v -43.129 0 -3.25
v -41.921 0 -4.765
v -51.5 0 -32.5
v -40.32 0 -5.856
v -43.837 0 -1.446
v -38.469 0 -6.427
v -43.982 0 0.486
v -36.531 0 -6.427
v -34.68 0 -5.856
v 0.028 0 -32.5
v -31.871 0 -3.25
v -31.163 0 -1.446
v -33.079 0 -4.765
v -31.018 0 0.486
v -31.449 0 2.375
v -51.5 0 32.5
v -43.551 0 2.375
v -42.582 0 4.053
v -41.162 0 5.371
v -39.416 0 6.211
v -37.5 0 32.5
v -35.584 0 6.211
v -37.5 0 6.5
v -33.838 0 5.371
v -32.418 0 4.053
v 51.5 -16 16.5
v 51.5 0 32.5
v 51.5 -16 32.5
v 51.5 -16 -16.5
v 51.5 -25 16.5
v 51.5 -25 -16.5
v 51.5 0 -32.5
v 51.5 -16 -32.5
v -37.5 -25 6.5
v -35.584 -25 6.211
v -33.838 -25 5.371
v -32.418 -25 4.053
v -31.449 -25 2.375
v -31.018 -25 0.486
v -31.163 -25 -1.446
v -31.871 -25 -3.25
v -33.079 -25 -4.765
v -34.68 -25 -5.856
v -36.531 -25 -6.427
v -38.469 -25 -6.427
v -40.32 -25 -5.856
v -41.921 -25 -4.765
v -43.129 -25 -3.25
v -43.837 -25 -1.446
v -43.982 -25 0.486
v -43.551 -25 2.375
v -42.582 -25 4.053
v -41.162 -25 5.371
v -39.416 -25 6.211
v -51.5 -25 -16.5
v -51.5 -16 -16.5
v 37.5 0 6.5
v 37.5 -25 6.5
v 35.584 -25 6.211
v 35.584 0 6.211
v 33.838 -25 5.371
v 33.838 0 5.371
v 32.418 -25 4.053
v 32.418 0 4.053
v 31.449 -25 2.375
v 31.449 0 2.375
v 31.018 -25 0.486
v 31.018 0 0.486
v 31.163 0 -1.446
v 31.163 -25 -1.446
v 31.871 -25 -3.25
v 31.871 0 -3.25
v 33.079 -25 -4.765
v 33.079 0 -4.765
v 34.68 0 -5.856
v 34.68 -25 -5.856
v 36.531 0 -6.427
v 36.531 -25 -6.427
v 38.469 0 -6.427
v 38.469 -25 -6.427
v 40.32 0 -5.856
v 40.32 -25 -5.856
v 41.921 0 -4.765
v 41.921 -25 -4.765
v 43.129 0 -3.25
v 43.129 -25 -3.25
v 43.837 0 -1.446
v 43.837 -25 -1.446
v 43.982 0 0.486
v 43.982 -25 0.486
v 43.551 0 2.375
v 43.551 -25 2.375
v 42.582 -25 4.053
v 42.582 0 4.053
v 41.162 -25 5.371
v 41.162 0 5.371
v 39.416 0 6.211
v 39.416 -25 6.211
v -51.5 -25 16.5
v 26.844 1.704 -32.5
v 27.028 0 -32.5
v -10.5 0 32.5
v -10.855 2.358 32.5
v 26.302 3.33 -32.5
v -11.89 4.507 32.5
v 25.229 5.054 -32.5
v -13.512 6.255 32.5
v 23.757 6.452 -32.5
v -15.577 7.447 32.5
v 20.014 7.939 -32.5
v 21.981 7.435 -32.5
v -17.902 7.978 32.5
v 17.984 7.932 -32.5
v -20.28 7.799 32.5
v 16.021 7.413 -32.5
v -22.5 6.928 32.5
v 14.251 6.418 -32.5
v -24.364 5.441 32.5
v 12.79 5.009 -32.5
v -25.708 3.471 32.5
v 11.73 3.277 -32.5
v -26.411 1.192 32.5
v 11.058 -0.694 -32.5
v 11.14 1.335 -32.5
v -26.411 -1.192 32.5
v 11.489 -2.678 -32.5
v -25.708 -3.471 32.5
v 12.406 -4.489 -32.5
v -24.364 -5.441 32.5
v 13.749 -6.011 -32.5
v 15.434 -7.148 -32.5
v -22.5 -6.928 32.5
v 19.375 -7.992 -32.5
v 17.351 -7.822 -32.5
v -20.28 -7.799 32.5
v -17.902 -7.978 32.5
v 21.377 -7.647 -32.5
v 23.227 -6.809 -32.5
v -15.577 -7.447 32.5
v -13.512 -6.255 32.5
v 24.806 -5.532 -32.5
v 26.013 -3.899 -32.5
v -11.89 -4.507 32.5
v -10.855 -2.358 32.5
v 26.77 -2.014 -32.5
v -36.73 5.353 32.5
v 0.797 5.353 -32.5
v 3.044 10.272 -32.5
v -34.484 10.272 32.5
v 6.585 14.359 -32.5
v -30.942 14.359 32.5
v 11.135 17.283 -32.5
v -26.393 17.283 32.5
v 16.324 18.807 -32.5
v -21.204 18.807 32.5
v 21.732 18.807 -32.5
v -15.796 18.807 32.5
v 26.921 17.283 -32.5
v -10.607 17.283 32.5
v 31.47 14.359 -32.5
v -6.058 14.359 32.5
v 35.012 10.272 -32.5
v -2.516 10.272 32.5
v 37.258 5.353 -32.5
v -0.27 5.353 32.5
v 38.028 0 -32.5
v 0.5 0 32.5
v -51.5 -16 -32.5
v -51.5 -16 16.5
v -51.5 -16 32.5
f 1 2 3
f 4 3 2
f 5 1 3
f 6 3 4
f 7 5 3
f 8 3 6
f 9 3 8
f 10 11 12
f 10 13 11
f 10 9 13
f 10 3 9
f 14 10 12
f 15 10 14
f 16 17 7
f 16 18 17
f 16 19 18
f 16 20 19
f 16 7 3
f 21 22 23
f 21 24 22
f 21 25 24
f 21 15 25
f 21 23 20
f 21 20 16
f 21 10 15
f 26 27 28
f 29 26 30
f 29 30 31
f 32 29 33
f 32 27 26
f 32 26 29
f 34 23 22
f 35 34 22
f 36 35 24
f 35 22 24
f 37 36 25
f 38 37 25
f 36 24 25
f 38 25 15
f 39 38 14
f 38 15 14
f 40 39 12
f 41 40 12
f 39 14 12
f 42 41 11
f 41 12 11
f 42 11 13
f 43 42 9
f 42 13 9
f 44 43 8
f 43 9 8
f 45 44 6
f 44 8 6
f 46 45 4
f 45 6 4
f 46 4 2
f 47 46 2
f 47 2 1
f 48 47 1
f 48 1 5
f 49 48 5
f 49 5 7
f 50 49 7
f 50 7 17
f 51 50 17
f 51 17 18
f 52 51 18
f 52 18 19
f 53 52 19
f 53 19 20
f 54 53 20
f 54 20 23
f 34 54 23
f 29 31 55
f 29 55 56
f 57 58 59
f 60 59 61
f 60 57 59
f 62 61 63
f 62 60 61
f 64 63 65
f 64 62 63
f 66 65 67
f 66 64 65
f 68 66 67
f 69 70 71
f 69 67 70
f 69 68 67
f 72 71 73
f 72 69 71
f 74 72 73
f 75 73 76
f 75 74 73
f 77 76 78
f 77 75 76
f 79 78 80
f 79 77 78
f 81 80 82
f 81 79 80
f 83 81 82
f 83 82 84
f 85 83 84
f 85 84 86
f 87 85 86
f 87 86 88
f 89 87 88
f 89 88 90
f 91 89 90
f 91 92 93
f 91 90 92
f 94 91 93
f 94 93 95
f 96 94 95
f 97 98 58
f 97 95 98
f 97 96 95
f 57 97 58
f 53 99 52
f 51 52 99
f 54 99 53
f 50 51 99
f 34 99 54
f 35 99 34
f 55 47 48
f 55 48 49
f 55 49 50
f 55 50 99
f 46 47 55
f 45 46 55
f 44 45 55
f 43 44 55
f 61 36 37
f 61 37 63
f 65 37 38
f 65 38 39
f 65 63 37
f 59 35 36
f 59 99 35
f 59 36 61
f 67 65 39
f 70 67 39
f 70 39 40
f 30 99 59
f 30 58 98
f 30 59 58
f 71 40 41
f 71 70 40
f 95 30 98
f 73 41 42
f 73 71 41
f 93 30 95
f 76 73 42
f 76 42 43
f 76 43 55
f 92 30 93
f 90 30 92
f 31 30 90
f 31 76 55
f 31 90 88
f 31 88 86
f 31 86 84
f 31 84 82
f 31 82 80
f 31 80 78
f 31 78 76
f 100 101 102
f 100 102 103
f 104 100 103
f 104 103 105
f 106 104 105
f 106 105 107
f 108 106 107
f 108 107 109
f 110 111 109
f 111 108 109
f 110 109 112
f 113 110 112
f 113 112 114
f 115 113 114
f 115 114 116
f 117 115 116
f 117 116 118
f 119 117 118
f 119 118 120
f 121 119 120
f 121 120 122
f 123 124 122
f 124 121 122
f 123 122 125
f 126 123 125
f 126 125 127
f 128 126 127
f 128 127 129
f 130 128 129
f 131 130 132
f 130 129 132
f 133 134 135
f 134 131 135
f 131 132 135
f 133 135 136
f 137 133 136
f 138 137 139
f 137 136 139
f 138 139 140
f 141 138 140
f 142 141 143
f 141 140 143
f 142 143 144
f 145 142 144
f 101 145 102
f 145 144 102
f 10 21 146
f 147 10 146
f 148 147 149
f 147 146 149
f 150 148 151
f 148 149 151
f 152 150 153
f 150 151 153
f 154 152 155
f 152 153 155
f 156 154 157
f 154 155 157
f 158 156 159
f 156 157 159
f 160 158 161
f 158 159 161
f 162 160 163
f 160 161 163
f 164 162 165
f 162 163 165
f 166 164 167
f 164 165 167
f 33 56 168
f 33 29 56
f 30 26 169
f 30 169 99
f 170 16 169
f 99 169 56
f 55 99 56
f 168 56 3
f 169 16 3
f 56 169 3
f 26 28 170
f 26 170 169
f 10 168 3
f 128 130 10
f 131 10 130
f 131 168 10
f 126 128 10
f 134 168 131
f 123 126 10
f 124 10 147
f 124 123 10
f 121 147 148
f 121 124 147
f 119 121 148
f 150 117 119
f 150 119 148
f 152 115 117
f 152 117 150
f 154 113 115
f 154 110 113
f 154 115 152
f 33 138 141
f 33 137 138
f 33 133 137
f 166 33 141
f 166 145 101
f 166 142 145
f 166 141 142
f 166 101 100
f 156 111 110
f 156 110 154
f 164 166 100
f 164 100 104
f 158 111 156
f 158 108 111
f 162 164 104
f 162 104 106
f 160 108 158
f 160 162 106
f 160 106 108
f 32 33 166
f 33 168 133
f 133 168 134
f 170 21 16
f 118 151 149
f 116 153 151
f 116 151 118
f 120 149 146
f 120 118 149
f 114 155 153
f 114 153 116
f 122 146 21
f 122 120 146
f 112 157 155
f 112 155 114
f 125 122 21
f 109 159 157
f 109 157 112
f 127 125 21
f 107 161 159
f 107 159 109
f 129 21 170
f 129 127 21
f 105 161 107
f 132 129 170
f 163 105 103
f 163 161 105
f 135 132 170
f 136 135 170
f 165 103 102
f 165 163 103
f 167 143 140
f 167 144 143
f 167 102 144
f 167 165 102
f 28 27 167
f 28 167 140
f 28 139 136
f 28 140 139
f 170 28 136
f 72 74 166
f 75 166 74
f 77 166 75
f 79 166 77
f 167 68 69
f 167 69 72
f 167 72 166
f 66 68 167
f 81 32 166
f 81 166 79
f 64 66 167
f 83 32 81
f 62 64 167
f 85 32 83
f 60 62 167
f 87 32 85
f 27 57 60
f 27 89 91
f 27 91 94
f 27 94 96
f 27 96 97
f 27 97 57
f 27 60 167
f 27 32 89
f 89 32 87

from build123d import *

# Parameters (mm, degrees)
BOSS_EXTRUDE1_DEPTH = 51.5
SKETCH2_R           = 6.5
CUT_EXTRUDE1_DEPTH  = 66.829324772
BOSS_EXTRUDE4_DEPTH = 75.055534995
SKETCH7_R           = 8
CUT_EXTRUDE3_DEPTH  = 86.666666667


with BuildPart() as part:
    # Sketch1 → Boss-Extrude1 (new, symmetric)
    with BuildSketch(Plane(origin=(0, 0, 0), x_dir=(0, 0, -1), z_dir=(1, 0, 0))):
        Polygon((32.5, 0), (-32.5, 0), (-32.5, -16), (-16.5, -16), (-16.5, -25), (16.5, -25), (16.5, -16), (32.5, -16), align=None)
    extrude(amount=BOSS_EXTRUDE1_DEPTH, both=True)

    # Sketch2 → Cut-Extrude1 (cut, through all)
    with BuildSketch(Plane(origin=(0, 0, 0), x_dir=(1, 0, 0), z_dir=(0, 1, 0))):
        with Locations(Location((-37.5, 0, 0), (0, 0, 270))):
            Circle(SKETCH2_R)
    cut_extrude1 = extrude(amount=-CUT_EXTRUDE1_DEPTH, mode=Mode.SUBTRACT)

    # Mirror1: Cut-Extrude1 across plane
    add(cut_extrude1.mirror(Plane(origin=(0, 0, 0), x_dir=(0, 0, 1), z_dir=(1, 0, 0))), mode=Mode.SUBTRACT)

    # Sketch5 → Boss-Extrude4 (add, along a direction that is not the sketch's normal)
    with BuildSketch(Plane.XY.offset(32.5)):
        with BuildLine():
            Line((0.5, 0), (-37.5, 0))
            ThreePointArc((-37.5, 0), (-18.5, 19), (0.5, 0))
        make_face()
    extrude(amount=-BOSS_EXTRUDE4_DEPTH, dir=(-0.5000000000000041, 0, 0.8660254037844363))

    # Sketch7 → Cut-Extrude3 (cut, along a direction that is not the sketch's normal)
    with BuildSketch(Plane.XY.offset(32.5)):
        with Locations((-18.5, 0)):
            Circle(SKETCH7_R)
    extrude(amount=-CUT_EXTRUDE3_DEPTH, dir=(-0.5000000000000041, 0, 0.8660254037844363), mode=Mode.SUBTRACT)


solid = part.part
